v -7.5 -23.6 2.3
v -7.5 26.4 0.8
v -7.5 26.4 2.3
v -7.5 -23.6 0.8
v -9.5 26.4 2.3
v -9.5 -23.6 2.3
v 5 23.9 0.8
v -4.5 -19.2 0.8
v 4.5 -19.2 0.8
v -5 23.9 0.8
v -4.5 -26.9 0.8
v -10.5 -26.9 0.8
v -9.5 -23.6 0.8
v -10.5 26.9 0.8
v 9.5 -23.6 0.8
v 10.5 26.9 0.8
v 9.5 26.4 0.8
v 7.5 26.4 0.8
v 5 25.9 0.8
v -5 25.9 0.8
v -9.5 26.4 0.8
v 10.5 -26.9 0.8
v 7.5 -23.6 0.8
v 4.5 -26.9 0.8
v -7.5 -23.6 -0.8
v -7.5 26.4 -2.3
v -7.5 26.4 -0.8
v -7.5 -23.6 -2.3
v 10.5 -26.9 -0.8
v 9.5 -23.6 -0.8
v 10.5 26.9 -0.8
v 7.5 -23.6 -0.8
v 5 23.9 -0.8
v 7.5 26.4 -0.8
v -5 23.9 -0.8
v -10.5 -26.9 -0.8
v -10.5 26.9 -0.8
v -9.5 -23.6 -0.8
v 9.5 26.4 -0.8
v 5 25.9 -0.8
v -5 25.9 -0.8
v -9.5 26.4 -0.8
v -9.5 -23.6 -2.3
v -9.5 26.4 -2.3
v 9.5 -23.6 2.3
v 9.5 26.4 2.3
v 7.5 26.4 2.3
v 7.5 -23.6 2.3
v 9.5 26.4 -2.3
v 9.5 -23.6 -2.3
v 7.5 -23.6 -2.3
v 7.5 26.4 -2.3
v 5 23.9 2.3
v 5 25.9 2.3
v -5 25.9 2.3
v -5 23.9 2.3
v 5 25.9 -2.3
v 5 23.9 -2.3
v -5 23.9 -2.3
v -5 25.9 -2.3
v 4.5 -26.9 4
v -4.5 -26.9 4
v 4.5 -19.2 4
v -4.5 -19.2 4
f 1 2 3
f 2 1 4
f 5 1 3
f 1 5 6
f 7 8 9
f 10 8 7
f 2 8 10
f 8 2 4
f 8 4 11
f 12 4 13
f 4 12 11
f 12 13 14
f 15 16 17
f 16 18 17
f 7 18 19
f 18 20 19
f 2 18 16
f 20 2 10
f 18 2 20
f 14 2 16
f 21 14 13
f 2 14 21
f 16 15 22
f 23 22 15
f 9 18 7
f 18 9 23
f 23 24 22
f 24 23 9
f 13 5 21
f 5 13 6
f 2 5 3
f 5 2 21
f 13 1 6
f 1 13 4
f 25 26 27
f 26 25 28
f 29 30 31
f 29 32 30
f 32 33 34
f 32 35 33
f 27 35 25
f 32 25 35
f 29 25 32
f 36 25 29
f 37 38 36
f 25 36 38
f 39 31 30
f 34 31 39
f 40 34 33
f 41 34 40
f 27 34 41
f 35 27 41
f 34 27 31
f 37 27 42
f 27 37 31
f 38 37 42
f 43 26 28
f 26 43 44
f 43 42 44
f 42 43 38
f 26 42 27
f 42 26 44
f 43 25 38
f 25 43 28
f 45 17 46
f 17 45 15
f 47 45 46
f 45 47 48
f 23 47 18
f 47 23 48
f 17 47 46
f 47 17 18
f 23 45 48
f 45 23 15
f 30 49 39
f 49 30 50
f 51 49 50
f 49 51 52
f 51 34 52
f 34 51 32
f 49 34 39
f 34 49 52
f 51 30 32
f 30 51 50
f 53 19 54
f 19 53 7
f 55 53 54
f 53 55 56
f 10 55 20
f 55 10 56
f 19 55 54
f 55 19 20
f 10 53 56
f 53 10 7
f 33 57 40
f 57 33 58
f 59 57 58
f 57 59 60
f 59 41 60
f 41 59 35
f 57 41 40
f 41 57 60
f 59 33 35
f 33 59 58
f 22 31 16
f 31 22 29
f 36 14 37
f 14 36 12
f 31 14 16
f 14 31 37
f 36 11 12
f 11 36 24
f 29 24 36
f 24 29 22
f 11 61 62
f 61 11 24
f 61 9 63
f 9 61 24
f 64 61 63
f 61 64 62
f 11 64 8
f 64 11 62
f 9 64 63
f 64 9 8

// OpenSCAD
/*=================================================

  Ultimate Pico module

  (c) David Annett
  25 April 2026


=================================================*/

// Imported modules

//include <metrichardware.scad>;

// Control rendering quality

$fa        = 1;
$fs        = 0.1;

Overlap    = 0.05;
Clearance  = 0.5;
showsample = true;


// Major dimensions

PicoUltWidth          =  21;    // X - Width of PCB
PicoUltLength         =  53.8;  // Y - Length of PCB
PicoUltThickness      =   1.6;  // Z - Thicknes of PCB, excluding componets

PicoUltUSBWidth       =   9;    // X
PicoUltUSBLength      =   7.7;  // Y
PicoUltUSBThickness   =   3.2;  // Z

PicoUltPinsWidth      =   2;    // X
PicoUltPinsLength     =  50;    // Y
PicoUltPinsProgLength =  10;    // X
PicoUltPinsDepth      =   1.5;  // Z
PicoUltPinsEdgeOffset  =  1;    // X To edge of pins, not center
PicoUltPinsFrontOffset =  3.3;  // Y To edge of pins, not center


// Derived dimemsions




// === The module ===

// Show module in place, centered on front face of active area
module PicoUltModule(
  colour = "green"
  )
{
  // PCB
  
  color(colour)
  cube([PicoUltWidth,
        PicoUltLength,
        PicoUltThickness],
       center = true);

  // Connector pins
    
  color("grey") {
    translate([(PicoUltWidth - PicoUltPinsWidth) / -2 + PicoUltPinsEdgeOffset,
               (PicoUltLength - PicoUltPinsLength) / -2 + PicoUltPinsFrontOffset,
               (PicoUltThickness + PicoUltPinsDepth) / 2])
      cube([PicoUltPinsWidth,
            PicoUltPinsLength,
            PicoUltPinsDepth],
           center = true);

    translate([(PicoUltWidth - PicoUltPinsWidth) / -2 + PicoUltPinsEdgeOffset,
               (PicoUltLength - PicoUltPinsLength) / -2 + PicoUltPinsFrontOffset,
               (PicoUltThickness + PicoUltPinsDepth) / -2])
      cube([PicoUltPinsWidth,
            PicoUltPinsLength,
            PicoUltPinsDepth],
           center = true);

    translate([(PicoUltWidth - PicoUltPinsWidth) / 2 - PicoUltPinsEdgeOffset,
               (PicoUltLength - PicoUltPinsLength) / -2 + PicoUltPinsFrontOffset,
               (PicoUltThickness + PicoUltPinsDepth) / 2])
      cube([PicoUltPinsWidth,
            PicoUltPinsLength,
            PicoUltPinsDepth],
           center = true);

    translate([(PicoUltWidth - PicoUltPinsWidth) / 2 - PicoUltPinsEdgeOffset,
               (PicoUltLength - PicoUltPinsLength) / -2 + PicoUltPinsFrontOffset,
               (PicoUltThickness + PicoUltPinsDepth) / -2])
      cube([PicoUltPinsWidth,
            PicoUltPinsLength,
            PicoUltPinsDepth],
           center = true);

    translate([0,
               (PicoUltLength - PicoUltPinsWidth) / 2 - PicoUltPinsEdgeOffset,
               (PicoUltThickness + PicoUltPinsDepth) / 2])
      cube([PicoUltPinsProgLength,
            PicoUltPinsWidth,
            PicoUltPinsDepth],
           center = true);

    translate([0,
               (PicoUltLength - PicoUltPinsWidth) / 2 - PicoUltPinsEdgeOffset,
               (PicoUltThickness + PicoUltPinsDepth) / -2])
      cube([PicoUltPinsProgLength,
            PicoUltPinsWidth,
            PicoUltPinsDepth],
           center = true);
  }

  // USB connector
  
  color("grey") {
    translate([0,
               (PicoUltLength - PicoUltUSBLength) / -2,
               (PicoUltThickness + PicoUltUSBThickness) / 2])
      cube([PicoUltUSBWidth,
            PicoUltUSBLength,
            PicoUltUSBThickness],
           center = true);
  }
 
}


// PCB with clearance added

module PicoUltPCBCutout()
{
  // PCB
  
  cube([PicoUltWidth + Clearance,
        PicoUltLength + Clearance,
        PicoUltThickness + Clearance],
       center = true);
}


// === Show samples ===

if (showsample) {
  PicoUltModule();
}
